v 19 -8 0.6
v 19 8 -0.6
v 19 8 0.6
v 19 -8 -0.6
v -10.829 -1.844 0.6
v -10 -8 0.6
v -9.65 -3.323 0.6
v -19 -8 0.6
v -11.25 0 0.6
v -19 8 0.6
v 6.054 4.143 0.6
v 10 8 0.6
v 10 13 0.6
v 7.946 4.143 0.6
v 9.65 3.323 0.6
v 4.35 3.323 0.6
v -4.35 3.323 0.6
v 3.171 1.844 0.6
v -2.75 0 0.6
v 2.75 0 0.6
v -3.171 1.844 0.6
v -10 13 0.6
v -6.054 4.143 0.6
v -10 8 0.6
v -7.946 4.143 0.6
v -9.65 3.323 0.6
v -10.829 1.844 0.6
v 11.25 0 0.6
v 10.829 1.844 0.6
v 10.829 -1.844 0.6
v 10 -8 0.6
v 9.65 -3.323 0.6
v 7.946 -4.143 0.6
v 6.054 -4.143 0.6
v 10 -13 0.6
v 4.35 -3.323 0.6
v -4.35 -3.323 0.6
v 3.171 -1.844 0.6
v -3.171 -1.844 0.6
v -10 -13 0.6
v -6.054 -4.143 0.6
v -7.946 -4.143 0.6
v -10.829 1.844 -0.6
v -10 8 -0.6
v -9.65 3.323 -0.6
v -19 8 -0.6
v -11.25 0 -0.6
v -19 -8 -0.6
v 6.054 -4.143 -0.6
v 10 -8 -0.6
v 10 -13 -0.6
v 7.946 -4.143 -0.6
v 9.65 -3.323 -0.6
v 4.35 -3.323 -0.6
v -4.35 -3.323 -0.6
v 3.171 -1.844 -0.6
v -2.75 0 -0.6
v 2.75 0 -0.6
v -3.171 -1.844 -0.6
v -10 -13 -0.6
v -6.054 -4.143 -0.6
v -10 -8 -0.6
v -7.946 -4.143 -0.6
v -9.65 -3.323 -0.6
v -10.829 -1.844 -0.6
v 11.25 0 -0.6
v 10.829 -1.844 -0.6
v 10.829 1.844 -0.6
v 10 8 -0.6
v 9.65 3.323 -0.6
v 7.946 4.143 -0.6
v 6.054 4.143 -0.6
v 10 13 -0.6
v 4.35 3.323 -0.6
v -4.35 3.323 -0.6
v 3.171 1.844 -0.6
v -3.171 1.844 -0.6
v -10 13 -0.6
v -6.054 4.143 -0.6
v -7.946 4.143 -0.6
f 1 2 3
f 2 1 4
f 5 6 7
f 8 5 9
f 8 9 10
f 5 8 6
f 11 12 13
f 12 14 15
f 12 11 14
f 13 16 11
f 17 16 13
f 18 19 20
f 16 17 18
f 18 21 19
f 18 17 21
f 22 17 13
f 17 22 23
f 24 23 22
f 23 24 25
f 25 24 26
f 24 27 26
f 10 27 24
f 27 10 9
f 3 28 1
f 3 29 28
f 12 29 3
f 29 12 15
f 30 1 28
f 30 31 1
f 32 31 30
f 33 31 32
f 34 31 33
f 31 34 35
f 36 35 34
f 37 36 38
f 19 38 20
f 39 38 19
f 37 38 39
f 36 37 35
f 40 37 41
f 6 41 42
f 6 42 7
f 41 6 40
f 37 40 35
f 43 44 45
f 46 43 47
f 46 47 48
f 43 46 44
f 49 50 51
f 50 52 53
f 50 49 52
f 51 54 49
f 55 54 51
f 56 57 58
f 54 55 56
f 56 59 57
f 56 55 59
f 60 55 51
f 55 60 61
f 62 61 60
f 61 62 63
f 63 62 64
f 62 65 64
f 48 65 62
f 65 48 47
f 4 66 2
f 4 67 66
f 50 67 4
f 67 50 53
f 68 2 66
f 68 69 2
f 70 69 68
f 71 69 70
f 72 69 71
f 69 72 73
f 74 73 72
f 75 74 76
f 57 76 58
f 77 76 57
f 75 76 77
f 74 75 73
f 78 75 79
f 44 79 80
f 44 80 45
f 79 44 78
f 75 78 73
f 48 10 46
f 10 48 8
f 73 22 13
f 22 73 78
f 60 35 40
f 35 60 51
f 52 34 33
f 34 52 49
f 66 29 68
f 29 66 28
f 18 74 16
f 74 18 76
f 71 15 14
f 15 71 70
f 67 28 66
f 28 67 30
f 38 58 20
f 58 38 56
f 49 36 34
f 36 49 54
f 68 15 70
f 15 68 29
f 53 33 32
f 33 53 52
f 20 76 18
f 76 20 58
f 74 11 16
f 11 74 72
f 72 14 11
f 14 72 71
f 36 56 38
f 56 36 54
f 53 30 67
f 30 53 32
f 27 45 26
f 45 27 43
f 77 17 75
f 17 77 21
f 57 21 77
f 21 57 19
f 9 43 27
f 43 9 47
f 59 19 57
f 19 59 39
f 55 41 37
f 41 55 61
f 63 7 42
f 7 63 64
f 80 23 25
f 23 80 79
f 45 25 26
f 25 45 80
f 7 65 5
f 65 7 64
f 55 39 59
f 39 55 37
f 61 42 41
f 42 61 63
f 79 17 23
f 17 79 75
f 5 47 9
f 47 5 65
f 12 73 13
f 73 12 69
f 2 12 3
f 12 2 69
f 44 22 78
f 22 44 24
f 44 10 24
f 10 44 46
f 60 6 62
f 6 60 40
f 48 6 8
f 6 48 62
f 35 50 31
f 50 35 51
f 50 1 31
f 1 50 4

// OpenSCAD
// [FL_INDEX: keywords="openscad, 3d_parametric, Clipless_pedal_cleat_shim, csg_solid" | COT="Parametric OpenSCAD design from 3DCodeverse"]
// Title: Clipless pedal cleat shim

thickness = 1.2;
difference() {
	cube([38,26,thickness], center=true);
	translate([14/2,0,0]) cylinder(r=4.25, h = thickness+1, center=true);
	translate([-14/2,0,0]) cylinder(r=4.25, h = thickness+1, center=true);
	translate([38/2, 26/2, 0]) corner();
	translate([-38/2, 26/2, 0]) corner();
	translate([-38/2, -26/2, 0]) corner();
	translate([38/2, -26/2, 0]) corner();
}
module corner() {
	cube([9*2,5*2,thickness+1], center = true);
}
